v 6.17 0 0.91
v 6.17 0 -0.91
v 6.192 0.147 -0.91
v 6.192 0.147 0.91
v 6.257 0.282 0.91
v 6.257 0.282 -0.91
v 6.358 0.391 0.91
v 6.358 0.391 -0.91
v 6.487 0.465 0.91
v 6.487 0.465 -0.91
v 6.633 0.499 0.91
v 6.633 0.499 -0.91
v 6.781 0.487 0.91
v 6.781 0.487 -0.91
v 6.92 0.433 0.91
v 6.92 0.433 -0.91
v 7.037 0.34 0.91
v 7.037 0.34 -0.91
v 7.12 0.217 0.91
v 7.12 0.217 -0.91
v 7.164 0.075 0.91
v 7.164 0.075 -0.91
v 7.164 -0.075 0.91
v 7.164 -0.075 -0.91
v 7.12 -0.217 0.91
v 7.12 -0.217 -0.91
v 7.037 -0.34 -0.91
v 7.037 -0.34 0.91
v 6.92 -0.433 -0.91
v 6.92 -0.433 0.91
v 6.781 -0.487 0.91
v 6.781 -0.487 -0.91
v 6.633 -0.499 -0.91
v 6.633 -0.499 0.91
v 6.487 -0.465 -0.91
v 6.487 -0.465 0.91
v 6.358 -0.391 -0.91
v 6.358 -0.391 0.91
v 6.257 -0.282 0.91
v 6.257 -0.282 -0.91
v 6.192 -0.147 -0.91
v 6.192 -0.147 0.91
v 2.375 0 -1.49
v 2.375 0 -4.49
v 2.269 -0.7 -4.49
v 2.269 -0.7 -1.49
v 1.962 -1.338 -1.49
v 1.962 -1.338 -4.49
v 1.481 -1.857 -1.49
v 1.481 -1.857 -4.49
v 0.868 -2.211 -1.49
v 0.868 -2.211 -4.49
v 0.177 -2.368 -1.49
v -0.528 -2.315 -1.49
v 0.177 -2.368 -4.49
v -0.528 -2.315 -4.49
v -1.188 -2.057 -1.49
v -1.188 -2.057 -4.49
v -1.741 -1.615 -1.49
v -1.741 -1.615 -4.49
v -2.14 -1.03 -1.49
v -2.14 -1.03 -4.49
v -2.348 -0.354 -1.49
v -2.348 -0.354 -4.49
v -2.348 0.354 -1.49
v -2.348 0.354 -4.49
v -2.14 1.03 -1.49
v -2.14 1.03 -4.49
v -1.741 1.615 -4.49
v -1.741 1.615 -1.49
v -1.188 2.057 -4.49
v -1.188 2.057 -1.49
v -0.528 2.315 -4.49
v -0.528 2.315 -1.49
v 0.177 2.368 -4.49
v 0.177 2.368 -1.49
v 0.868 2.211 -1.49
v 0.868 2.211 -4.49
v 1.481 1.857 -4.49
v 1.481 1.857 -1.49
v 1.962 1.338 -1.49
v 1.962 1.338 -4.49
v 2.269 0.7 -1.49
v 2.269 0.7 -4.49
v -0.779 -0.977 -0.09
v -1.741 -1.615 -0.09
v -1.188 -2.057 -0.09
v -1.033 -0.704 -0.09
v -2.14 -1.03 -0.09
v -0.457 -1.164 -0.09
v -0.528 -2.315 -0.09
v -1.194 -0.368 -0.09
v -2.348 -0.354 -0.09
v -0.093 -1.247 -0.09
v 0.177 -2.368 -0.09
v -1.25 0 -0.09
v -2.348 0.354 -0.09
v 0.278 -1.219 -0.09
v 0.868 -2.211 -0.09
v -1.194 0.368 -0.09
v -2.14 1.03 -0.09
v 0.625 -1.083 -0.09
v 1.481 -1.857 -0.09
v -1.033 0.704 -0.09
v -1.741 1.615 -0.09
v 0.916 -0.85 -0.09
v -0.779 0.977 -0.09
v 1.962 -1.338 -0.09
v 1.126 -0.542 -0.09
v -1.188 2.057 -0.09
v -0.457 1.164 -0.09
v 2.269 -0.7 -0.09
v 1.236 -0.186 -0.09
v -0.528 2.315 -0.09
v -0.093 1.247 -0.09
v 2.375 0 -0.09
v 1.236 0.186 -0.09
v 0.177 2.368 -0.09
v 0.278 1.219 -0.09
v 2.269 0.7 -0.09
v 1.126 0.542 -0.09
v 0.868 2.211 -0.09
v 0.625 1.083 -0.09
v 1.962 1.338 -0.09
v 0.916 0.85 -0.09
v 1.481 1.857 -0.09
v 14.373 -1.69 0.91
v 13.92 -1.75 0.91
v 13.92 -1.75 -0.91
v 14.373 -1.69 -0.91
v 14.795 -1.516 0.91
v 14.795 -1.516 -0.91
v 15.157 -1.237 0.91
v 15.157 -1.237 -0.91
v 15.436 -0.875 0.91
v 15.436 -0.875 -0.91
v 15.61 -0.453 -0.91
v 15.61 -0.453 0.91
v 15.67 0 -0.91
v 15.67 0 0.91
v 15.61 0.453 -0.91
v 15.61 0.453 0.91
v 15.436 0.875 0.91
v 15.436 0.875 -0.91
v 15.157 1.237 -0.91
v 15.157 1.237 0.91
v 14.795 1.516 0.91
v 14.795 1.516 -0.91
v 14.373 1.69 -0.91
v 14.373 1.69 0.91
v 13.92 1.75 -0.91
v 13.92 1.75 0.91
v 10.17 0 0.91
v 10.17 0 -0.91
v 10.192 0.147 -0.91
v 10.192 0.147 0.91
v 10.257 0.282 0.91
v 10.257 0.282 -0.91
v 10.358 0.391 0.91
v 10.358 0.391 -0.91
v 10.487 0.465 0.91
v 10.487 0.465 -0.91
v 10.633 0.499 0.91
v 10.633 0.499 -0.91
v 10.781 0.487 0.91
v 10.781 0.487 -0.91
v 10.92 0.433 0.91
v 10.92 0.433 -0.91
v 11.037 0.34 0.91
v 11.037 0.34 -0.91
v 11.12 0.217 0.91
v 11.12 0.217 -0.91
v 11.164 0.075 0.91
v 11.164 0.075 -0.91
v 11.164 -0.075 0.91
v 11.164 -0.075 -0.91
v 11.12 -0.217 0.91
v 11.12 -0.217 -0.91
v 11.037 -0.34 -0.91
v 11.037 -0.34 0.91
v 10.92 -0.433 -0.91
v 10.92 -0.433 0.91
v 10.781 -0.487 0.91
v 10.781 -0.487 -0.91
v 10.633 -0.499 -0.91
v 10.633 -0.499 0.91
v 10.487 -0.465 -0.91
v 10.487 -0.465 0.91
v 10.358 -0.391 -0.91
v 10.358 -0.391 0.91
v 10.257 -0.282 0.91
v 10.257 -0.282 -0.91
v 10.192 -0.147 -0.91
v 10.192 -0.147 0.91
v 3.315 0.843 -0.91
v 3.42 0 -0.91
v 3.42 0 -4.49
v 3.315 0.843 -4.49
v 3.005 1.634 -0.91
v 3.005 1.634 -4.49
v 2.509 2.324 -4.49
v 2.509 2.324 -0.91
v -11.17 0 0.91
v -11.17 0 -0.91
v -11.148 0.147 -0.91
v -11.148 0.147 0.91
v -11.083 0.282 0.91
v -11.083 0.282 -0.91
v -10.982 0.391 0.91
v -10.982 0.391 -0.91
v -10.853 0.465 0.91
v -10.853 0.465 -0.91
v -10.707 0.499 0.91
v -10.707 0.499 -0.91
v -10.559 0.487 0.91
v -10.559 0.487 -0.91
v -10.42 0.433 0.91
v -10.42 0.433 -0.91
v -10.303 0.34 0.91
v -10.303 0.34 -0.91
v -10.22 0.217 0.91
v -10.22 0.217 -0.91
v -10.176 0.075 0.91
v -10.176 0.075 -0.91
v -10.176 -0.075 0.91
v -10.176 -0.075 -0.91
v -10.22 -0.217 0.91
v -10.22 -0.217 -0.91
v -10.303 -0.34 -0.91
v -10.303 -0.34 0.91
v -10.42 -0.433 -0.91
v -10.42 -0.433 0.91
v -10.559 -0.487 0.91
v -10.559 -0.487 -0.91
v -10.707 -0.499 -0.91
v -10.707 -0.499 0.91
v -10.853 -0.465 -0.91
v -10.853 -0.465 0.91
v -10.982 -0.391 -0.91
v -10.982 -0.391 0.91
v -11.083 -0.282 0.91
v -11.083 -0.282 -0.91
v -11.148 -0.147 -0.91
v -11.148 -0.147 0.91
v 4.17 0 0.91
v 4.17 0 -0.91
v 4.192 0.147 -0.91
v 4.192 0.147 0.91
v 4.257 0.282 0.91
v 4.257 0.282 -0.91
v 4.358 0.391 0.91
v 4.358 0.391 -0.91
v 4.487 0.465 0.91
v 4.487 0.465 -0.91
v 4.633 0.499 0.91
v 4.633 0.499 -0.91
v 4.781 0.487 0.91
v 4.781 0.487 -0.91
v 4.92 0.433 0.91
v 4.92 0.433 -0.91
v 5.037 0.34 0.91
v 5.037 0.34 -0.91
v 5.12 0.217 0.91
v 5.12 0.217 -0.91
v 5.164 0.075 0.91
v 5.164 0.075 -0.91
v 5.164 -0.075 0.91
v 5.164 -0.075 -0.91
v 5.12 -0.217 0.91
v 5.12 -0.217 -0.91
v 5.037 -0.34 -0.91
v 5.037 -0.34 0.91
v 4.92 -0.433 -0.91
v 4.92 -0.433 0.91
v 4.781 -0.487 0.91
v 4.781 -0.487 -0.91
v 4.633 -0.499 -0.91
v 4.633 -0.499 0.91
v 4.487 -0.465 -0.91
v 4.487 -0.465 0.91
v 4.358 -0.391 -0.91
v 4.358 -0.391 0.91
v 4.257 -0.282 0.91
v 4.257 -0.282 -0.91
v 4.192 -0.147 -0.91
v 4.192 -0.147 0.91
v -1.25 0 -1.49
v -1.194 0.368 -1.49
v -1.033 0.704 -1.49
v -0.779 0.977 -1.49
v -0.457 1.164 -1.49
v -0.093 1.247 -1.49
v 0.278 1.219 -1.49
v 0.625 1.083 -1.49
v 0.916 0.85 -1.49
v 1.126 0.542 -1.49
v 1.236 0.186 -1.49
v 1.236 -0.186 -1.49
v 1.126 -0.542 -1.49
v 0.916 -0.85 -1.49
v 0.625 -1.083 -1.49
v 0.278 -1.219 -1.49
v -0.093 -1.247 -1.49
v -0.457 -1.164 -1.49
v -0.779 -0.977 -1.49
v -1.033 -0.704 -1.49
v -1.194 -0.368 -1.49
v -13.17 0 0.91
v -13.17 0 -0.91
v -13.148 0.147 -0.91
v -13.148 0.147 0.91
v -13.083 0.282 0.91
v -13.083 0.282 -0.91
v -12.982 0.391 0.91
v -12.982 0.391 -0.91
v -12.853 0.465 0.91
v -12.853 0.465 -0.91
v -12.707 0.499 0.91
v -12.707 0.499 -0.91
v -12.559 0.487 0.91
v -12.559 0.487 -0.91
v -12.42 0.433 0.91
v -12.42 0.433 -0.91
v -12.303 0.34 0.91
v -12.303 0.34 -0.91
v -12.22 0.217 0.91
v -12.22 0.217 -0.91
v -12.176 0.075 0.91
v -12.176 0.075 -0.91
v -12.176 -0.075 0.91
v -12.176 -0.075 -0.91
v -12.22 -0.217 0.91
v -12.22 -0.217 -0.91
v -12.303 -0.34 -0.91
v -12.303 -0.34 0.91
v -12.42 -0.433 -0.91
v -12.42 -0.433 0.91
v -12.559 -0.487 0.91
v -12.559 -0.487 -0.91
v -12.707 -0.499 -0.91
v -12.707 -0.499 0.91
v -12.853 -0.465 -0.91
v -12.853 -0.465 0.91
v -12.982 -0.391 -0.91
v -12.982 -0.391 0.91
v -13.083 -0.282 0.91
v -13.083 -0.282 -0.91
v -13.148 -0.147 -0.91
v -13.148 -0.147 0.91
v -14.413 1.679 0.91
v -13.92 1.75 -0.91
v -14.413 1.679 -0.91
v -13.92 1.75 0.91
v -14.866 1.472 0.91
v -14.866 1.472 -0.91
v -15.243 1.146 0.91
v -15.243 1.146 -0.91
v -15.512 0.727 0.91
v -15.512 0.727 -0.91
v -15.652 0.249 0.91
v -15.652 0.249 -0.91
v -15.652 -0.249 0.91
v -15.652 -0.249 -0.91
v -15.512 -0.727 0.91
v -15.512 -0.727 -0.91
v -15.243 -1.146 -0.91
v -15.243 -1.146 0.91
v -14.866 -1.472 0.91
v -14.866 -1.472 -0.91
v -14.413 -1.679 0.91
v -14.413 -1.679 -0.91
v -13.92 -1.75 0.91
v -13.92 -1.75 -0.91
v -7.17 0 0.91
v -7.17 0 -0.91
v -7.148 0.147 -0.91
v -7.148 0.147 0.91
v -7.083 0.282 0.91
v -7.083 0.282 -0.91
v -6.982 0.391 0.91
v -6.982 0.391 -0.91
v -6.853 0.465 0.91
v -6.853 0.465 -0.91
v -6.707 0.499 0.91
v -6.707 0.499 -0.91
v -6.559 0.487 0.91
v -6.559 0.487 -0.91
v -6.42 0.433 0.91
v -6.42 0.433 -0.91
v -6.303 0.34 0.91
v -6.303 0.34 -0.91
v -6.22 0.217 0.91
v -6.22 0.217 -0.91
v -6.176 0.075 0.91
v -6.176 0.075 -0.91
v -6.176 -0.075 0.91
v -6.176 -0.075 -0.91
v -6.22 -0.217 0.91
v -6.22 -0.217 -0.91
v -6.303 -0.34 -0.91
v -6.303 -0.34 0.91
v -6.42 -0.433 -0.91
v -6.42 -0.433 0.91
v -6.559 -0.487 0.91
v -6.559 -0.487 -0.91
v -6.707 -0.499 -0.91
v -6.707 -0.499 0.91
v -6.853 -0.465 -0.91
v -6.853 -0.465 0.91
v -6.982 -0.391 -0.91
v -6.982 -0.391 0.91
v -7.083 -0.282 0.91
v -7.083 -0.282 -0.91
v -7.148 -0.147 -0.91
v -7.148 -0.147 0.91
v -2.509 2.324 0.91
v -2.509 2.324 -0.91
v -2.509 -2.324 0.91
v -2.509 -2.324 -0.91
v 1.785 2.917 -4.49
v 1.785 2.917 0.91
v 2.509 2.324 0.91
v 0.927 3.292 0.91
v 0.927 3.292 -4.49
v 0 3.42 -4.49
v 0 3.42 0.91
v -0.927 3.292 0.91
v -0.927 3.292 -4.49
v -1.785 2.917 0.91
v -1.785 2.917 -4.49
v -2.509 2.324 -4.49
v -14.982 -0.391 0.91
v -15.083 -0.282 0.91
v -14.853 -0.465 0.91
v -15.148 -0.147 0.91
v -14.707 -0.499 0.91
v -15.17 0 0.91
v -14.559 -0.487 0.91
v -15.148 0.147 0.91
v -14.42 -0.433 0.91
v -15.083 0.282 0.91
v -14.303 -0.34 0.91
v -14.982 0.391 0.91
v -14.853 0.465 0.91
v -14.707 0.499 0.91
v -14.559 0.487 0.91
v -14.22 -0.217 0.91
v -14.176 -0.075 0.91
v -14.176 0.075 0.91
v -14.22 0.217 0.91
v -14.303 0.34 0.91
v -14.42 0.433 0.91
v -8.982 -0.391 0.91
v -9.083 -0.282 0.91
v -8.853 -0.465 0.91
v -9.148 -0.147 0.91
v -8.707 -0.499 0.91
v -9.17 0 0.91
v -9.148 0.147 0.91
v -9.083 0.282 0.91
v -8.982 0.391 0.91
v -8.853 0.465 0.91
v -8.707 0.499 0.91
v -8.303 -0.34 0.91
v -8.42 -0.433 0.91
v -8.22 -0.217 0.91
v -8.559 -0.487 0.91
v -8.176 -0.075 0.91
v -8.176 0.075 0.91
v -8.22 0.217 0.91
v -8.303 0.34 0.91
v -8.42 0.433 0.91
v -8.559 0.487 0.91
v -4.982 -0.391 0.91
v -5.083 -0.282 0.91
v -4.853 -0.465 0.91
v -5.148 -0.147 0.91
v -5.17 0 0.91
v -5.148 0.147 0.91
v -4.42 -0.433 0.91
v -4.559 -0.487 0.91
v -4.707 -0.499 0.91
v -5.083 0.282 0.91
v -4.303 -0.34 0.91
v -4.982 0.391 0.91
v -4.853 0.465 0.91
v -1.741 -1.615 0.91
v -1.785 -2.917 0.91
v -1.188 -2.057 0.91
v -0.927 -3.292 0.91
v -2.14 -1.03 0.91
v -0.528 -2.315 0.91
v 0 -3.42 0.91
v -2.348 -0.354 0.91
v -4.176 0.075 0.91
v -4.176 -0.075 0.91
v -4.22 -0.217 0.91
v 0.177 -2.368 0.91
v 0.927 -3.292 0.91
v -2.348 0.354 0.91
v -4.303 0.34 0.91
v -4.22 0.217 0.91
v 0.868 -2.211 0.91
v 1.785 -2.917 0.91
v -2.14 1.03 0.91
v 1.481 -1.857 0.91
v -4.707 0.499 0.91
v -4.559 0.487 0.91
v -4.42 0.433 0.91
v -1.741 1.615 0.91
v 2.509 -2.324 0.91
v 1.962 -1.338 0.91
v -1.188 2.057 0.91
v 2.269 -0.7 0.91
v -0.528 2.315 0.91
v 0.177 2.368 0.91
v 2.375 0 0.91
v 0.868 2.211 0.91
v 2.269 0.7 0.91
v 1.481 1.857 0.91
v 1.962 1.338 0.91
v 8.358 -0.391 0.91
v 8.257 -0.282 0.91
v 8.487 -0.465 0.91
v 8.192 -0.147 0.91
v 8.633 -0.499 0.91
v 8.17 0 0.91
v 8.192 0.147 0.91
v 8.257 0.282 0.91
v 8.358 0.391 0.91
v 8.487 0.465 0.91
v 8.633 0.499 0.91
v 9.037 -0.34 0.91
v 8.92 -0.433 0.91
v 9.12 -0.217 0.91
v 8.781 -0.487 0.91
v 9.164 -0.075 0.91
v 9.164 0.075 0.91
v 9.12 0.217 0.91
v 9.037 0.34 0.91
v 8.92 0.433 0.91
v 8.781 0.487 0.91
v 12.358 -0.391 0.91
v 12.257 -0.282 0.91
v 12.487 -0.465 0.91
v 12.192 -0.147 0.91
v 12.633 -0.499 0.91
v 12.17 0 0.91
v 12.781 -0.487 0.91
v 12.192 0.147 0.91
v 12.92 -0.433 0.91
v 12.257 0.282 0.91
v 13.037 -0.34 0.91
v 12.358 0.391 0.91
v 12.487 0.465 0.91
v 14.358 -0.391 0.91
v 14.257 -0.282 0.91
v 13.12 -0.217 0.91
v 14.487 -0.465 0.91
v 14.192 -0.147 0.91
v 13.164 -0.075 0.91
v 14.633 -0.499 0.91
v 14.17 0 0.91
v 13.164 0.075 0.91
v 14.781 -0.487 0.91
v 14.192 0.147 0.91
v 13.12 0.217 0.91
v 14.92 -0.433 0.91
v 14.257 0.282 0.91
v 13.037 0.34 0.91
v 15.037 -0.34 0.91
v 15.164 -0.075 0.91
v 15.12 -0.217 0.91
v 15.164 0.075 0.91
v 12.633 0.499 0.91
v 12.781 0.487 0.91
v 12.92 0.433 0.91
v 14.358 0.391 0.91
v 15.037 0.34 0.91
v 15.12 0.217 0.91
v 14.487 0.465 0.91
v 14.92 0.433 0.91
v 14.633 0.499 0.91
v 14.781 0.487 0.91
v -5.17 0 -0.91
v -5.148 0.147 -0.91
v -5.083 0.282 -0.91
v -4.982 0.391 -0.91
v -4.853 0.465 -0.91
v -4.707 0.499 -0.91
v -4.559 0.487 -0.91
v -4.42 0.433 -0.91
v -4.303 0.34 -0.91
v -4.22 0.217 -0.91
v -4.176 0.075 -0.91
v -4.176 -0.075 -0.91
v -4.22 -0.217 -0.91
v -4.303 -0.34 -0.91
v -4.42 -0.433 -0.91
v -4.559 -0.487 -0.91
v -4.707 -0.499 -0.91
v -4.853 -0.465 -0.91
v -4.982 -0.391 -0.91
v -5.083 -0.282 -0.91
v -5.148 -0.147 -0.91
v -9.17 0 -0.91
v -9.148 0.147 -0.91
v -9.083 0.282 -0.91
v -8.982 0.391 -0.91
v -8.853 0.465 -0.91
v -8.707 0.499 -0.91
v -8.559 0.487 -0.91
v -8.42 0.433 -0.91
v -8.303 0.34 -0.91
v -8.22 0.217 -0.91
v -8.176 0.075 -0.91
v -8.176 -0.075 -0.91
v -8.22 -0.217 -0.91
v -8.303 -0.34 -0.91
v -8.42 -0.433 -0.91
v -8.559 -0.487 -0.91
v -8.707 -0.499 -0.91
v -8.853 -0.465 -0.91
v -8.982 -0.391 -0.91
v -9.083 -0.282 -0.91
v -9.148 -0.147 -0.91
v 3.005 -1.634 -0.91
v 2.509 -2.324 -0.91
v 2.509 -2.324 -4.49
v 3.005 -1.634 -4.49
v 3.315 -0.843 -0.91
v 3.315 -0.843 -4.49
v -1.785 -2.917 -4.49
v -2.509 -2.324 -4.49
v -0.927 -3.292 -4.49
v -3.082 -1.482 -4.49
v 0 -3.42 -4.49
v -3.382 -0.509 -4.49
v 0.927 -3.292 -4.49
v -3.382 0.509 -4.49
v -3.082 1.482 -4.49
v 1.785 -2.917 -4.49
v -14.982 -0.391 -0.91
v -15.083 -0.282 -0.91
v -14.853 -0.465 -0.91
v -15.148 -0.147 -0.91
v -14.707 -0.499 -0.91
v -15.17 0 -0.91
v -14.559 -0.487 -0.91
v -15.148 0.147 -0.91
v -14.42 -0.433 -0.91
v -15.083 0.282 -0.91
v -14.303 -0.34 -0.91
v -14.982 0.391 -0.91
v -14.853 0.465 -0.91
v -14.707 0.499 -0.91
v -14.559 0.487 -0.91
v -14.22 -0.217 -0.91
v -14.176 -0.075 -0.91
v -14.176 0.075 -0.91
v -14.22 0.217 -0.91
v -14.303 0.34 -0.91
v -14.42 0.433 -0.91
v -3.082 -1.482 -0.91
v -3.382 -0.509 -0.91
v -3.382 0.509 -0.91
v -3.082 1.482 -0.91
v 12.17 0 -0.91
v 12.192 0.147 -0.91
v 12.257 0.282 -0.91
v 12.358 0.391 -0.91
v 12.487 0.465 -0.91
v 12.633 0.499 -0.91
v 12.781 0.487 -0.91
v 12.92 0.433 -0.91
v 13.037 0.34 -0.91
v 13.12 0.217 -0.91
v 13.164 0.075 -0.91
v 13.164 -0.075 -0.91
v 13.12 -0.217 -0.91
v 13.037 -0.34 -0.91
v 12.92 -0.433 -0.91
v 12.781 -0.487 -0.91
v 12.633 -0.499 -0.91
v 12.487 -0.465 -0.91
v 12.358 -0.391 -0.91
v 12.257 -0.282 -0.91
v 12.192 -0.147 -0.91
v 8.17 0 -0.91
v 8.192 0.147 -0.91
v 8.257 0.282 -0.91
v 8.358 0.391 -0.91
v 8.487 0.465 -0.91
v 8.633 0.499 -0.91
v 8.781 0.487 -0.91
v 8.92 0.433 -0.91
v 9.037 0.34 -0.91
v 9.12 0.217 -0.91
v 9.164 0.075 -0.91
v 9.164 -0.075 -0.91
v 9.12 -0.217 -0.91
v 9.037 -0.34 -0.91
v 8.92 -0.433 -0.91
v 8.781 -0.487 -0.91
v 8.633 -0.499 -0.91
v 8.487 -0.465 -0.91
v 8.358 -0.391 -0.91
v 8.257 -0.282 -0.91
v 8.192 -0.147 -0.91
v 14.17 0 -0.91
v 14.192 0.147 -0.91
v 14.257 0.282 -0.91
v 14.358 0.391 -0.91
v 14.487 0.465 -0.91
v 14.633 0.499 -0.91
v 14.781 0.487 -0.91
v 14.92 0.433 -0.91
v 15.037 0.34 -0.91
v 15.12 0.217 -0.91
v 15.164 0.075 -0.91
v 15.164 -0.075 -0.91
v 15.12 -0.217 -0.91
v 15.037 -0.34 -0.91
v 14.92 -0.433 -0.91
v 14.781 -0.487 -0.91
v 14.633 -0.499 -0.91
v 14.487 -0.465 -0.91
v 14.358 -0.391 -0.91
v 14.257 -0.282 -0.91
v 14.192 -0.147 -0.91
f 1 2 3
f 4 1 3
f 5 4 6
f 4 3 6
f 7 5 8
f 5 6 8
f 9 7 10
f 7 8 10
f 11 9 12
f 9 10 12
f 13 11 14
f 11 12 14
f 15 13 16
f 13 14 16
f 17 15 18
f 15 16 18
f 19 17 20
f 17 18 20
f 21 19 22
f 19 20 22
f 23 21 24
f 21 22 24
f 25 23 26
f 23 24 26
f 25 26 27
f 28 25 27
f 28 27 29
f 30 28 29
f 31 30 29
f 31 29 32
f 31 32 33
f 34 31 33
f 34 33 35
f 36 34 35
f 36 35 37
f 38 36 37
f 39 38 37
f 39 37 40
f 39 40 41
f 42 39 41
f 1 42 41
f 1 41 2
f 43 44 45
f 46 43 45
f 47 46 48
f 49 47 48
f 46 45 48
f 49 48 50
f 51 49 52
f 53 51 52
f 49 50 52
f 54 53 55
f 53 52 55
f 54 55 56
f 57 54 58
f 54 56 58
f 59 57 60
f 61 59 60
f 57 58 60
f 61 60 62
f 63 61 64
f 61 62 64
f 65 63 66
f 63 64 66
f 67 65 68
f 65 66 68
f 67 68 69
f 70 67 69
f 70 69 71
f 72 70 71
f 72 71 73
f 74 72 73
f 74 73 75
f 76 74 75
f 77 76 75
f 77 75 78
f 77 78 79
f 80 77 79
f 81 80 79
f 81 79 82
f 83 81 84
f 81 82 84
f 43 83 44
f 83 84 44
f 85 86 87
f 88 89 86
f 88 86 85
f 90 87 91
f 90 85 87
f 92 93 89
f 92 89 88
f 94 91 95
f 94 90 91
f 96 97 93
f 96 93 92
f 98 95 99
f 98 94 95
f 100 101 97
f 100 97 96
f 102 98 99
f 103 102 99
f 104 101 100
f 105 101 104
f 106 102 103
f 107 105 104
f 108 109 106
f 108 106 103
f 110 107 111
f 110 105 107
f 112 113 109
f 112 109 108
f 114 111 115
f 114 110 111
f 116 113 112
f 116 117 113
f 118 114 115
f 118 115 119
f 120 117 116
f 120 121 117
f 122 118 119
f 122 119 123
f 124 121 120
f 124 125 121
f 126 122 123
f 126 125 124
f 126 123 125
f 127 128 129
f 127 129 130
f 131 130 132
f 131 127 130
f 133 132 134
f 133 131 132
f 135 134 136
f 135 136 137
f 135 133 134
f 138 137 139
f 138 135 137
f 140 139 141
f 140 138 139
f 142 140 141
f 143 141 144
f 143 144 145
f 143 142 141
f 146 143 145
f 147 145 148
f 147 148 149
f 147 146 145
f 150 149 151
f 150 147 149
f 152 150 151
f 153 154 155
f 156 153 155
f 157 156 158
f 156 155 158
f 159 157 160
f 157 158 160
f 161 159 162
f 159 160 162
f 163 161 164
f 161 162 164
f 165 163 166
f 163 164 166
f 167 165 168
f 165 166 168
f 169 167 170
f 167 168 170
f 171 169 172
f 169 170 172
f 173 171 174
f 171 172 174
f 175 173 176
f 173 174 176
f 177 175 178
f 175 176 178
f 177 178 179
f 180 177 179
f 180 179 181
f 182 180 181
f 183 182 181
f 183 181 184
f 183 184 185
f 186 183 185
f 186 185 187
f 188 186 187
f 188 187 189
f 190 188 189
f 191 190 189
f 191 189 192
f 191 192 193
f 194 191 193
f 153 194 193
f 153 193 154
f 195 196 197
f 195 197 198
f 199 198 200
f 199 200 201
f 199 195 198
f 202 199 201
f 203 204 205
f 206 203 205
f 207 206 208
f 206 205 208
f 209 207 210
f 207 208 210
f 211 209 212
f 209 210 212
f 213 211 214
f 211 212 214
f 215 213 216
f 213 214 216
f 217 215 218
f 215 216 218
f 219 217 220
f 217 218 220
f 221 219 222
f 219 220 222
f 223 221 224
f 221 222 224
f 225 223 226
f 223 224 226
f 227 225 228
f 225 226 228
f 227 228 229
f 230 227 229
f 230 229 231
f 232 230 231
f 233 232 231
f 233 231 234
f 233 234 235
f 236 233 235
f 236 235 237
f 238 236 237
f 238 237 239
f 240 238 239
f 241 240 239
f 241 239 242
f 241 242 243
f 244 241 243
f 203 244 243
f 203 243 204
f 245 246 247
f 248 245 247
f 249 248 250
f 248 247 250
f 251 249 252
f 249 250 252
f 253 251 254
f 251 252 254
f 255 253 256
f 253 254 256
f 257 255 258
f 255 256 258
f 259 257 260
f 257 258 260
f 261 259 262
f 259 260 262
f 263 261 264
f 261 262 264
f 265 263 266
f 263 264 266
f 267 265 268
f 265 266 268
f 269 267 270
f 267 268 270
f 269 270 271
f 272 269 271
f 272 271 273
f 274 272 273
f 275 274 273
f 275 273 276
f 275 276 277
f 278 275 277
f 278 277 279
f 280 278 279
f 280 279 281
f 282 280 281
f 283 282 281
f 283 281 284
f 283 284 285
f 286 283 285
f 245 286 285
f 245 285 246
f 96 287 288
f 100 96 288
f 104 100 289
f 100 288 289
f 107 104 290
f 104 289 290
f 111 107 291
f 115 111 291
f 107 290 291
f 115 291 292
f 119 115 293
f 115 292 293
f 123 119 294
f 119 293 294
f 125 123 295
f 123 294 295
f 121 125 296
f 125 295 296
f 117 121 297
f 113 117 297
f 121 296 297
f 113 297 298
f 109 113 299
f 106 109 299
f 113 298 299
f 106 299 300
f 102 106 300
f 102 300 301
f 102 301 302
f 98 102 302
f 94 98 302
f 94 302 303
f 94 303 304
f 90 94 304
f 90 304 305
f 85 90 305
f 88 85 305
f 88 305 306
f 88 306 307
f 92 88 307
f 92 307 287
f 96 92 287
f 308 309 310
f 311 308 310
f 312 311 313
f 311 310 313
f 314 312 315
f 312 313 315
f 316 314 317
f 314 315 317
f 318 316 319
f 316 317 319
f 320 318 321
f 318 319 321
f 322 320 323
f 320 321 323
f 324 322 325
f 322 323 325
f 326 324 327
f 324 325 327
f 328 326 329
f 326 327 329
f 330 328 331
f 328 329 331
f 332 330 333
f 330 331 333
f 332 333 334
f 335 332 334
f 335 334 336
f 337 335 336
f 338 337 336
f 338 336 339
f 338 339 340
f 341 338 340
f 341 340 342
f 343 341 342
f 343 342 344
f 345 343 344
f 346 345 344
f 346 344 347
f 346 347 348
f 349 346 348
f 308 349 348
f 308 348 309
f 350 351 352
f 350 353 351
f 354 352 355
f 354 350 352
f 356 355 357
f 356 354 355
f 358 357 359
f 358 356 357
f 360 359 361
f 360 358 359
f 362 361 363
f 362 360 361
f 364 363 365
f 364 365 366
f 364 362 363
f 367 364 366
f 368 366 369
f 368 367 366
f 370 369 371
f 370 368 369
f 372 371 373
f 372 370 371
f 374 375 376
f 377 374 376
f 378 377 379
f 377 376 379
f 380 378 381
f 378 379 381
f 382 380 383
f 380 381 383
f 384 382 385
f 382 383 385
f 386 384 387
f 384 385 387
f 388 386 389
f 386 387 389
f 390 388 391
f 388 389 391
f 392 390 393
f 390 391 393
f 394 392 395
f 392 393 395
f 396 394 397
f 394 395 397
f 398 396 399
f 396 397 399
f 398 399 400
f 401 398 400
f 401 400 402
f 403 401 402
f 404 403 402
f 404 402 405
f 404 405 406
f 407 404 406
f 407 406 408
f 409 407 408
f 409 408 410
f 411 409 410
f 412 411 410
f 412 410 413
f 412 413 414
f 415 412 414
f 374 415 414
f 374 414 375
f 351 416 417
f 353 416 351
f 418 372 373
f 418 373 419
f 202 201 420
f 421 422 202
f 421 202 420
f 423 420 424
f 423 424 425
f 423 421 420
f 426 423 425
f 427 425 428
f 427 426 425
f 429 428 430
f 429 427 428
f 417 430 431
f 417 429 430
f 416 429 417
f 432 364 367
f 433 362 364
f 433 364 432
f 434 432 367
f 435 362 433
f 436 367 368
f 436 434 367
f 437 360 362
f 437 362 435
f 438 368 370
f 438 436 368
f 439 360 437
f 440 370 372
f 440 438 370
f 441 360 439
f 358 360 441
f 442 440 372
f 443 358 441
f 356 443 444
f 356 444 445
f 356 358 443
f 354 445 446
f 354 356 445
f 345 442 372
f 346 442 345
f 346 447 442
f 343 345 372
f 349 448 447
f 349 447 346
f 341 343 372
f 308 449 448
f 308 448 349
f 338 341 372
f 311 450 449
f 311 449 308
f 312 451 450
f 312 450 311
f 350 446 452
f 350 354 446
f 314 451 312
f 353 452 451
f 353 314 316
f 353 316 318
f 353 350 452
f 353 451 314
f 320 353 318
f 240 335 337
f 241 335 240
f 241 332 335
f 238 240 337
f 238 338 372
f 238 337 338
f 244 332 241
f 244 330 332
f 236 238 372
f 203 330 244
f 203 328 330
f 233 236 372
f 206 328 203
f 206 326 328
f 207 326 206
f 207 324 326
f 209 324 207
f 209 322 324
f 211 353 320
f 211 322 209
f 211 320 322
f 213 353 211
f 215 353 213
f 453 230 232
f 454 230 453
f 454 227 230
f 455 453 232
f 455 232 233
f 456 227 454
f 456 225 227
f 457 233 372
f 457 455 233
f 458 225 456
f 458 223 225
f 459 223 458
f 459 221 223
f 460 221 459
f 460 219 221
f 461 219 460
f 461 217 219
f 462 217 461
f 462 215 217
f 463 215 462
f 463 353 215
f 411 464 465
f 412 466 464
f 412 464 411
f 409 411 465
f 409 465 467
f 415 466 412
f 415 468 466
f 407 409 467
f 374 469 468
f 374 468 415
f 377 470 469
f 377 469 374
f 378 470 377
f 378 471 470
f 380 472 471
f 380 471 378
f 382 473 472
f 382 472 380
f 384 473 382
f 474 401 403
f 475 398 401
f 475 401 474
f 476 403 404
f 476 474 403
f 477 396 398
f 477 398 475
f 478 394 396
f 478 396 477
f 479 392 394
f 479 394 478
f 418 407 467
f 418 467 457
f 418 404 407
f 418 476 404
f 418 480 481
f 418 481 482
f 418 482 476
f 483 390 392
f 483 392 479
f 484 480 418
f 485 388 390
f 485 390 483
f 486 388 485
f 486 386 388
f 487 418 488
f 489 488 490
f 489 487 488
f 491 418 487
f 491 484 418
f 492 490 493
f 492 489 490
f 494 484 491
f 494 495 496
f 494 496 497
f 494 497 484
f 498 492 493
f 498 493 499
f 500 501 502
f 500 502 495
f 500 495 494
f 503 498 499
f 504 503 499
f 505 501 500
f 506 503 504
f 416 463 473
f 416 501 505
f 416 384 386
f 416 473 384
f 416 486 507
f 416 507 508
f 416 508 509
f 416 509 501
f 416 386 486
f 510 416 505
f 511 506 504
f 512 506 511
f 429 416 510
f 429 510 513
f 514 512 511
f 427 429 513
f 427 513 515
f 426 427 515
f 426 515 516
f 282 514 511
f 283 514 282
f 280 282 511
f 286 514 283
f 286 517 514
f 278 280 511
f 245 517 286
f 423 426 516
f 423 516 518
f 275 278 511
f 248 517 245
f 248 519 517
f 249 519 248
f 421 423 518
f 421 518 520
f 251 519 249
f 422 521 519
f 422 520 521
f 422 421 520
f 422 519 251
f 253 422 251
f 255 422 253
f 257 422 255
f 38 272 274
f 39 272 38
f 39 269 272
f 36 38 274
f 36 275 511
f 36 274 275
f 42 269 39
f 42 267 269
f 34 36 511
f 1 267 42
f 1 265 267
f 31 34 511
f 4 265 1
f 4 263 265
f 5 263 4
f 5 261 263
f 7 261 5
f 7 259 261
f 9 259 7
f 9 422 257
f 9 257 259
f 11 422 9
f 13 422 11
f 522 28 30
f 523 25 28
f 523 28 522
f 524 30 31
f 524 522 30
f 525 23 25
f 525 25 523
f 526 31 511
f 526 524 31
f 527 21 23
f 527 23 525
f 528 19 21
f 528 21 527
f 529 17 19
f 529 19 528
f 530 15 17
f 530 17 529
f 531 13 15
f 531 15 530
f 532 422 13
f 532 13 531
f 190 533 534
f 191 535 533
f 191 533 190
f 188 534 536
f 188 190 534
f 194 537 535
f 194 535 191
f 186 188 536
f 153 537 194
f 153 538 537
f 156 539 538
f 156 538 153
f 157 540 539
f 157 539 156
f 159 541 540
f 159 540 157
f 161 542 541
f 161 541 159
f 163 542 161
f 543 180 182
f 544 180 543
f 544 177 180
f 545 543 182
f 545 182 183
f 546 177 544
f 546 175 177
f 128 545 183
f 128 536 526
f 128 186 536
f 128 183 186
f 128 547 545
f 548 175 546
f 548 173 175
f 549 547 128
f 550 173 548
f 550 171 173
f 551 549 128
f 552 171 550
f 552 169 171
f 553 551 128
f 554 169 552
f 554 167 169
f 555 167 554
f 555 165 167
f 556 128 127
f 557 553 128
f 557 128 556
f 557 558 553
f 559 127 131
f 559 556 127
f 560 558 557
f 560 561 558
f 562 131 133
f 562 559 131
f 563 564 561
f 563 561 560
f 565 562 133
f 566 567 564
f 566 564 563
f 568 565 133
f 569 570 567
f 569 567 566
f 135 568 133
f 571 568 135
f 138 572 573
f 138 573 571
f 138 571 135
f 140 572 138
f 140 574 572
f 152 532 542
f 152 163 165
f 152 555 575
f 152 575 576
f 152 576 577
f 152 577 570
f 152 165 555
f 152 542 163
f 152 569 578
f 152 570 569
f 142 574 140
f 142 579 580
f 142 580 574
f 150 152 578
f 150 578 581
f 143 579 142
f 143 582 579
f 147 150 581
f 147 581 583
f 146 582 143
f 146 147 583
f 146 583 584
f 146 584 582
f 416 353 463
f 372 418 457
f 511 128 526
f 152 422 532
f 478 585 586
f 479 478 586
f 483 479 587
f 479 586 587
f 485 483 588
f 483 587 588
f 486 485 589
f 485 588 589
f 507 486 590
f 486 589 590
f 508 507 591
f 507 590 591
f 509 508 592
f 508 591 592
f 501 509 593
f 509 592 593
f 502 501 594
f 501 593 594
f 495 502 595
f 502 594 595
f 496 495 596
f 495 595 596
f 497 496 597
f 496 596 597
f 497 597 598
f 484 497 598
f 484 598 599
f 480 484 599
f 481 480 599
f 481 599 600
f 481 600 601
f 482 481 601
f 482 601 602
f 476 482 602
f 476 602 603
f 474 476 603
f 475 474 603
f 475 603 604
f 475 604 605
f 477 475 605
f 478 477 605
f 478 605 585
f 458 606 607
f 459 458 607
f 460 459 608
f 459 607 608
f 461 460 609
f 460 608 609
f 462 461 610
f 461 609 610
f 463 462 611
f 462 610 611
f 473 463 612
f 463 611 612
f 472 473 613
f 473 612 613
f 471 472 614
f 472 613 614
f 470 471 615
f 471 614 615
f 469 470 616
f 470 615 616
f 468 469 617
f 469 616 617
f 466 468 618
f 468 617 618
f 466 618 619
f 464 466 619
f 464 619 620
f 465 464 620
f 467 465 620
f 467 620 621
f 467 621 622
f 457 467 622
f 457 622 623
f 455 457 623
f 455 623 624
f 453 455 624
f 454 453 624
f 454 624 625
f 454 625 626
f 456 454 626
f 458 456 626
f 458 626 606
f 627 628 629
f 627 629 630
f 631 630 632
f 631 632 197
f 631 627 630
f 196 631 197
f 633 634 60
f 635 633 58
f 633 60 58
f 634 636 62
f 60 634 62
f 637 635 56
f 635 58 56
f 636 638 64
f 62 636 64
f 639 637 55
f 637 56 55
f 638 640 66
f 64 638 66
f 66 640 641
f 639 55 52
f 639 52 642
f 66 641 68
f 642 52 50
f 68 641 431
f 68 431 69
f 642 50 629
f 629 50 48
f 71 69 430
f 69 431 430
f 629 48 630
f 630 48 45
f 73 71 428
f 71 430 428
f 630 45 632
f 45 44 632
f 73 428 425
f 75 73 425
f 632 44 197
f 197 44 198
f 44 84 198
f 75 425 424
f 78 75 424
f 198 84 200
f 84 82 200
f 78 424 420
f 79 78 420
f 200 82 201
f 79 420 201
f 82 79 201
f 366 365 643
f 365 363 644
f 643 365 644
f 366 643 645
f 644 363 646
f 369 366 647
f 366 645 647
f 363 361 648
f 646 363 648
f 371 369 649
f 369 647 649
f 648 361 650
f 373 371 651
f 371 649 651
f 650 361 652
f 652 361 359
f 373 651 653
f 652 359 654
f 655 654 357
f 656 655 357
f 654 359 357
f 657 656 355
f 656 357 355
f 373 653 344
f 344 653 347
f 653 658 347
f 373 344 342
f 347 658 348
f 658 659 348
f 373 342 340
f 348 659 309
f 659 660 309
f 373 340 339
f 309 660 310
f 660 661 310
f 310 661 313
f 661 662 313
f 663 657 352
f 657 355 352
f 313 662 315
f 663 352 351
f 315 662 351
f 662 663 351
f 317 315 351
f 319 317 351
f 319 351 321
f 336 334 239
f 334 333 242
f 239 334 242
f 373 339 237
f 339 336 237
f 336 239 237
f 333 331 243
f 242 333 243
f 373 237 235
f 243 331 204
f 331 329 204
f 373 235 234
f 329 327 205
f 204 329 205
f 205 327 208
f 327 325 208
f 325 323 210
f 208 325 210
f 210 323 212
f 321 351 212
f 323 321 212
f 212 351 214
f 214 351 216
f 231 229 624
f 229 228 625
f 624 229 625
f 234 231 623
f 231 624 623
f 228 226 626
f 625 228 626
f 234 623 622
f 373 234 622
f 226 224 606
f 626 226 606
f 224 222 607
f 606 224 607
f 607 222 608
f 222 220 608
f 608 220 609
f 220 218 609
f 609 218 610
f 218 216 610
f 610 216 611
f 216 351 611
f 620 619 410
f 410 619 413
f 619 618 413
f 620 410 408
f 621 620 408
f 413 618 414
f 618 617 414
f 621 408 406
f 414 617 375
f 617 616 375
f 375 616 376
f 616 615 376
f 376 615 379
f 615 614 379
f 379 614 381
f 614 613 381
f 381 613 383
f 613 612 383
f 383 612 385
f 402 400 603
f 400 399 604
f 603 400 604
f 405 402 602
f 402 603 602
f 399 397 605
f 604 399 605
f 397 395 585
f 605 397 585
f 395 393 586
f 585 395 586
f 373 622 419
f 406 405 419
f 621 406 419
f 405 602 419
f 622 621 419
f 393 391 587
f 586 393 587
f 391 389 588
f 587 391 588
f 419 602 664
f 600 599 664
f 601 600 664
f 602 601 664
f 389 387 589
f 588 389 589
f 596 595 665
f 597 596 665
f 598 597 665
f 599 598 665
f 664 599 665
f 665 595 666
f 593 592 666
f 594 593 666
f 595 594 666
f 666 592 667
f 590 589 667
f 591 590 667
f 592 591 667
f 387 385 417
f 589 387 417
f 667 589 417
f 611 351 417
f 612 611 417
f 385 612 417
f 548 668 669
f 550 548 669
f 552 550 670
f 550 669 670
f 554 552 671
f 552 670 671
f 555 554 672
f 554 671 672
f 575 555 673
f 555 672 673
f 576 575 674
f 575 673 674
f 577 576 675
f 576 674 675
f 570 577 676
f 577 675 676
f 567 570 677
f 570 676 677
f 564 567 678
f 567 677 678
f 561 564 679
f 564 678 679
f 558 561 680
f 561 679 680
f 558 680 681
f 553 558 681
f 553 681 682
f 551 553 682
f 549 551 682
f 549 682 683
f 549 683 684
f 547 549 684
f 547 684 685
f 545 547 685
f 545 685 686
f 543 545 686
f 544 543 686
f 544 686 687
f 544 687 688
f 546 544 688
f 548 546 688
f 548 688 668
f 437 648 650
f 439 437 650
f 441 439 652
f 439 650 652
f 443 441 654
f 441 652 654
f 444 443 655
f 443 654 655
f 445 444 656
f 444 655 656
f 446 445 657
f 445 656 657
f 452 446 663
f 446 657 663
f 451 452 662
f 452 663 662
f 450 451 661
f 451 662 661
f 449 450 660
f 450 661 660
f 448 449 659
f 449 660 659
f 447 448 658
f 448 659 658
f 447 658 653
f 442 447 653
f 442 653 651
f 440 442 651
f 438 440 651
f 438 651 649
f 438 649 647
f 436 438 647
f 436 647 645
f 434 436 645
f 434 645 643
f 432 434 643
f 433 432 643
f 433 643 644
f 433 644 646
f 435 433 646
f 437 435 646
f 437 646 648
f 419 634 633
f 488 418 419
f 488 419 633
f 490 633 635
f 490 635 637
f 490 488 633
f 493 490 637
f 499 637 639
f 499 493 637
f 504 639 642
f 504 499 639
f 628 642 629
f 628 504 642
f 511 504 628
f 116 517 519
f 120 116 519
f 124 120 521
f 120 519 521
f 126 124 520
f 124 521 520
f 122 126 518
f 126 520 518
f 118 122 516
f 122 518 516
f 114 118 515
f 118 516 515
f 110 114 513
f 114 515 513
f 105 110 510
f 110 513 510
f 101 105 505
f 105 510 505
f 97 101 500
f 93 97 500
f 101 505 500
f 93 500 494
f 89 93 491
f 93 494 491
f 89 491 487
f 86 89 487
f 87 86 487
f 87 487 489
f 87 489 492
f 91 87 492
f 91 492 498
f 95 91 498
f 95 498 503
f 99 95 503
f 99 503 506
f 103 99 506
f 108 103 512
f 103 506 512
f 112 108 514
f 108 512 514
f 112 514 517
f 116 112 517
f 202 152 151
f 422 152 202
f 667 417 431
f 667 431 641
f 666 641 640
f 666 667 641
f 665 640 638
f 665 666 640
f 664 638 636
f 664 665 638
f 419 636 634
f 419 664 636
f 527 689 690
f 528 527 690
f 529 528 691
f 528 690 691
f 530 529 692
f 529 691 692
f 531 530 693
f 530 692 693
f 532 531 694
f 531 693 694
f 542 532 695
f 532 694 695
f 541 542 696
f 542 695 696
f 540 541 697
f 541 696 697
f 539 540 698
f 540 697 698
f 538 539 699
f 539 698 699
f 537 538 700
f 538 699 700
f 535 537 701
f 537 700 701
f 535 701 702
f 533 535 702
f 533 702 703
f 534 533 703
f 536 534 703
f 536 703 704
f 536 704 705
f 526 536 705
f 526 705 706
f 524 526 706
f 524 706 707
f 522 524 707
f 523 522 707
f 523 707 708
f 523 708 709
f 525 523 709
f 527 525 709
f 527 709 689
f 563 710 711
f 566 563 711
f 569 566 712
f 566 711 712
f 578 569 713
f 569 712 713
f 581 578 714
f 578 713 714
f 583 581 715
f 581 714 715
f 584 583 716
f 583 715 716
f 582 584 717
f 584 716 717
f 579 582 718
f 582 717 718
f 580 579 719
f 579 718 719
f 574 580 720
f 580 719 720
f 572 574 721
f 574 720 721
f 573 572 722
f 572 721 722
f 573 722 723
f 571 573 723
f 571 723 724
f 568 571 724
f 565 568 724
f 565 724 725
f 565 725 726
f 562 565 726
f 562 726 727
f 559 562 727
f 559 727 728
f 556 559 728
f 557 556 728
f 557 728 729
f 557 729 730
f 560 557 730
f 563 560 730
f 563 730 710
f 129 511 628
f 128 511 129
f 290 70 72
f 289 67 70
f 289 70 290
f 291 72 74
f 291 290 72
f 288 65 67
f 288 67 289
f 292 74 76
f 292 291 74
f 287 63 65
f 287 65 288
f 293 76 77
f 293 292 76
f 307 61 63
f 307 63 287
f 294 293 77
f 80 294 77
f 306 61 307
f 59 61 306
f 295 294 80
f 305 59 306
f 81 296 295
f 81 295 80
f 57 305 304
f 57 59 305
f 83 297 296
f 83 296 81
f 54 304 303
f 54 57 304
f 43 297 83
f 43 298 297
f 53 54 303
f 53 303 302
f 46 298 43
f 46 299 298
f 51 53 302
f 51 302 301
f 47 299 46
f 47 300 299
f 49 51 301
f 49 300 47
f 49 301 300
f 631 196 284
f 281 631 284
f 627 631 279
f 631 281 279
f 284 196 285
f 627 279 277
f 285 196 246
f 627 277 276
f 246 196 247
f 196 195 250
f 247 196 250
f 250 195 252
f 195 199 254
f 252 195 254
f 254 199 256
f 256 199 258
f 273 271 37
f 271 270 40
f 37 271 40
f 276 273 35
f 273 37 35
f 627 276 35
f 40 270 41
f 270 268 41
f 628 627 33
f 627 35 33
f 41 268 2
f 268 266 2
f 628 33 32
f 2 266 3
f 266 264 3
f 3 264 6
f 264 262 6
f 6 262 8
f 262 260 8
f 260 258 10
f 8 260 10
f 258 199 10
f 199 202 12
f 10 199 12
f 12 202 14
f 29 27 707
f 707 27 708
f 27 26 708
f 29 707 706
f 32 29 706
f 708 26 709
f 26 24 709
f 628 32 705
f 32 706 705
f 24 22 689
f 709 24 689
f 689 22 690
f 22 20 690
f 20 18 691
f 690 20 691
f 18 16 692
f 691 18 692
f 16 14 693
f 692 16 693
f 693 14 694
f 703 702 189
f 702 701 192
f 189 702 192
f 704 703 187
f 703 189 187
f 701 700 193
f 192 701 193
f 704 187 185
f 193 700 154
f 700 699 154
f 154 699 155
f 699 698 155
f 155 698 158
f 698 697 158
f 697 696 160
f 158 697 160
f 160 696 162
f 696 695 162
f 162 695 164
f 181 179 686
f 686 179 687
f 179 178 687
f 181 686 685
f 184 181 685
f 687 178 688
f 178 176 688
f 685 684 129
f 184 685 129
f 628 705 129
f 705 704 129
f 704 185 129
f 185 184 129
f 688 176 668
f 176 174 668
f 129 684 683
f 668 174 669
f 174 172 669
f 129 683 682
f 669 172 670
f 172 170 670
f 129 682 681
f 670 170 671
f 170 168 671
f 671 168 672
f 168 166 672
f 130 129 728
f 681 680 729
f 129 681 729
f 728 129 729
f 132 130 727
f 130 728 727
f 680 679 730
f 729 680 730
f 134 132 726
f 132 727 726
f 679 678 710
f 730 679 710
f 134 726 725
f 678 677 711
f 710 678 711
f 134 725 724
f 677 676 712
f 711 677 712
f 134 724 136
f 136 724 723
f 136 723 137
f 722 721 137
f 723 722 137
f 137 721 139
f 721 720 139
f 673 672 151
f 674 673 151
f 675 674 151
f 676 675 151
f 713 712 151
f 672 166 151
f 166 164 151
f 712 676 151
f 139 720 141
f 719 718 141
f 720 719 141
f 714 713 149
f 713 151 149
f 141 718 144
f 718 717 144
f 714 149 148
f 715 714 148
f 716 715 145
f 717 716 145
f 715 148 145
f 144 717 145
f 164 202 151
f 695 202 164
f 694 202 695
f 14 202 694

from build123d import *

# Parameters (mm, degrees)
F1_DEPTH = 0.91
F3_DEPTH = 5.4
F4_R     = 2.375
F5_DEPTH = 1
F6_R     = 2.375
F7_DEPTH = 3
F9_D     = 2.5
F11_D    = 1


with BuildPart() as f1:
    # F0 (on Top) → F1 (new body, symmetric)
    with BuildSketch(Plane.XY):
        with BuildLine():
            Line((-13.92, -1.75), (-13.92, 1.75))
            ThreePointArc((-13.92, 1.75), (-15.67, 0), (-13.92, -1.75))
        make_face()
        with BuildLine():
            ThreePointArc((-13.92, -1.75), (-12.6825631329, -1.2374368671), (-12.17, 0))
            ThreePointArc((-12.17, 0), (-12.6825631329, 1.2374368671), (-13.92, 1.75))
            Line((-13.92, 1.75), (-13.92, -1.75))
        make_face()
        with BuildLine():
            ThreePointArc((-13.92, 1.75), (-12.6825631329, 1.2374368671), (-12.17, 0))
            ThreePointArc((-12.17, 0), (-12.6825631329, -1.2374368671), (-13.92, -1.75))
            Line((-13.92, -1.75), (0, -2.45))
            Line((0, -2.45), (0, 2.45))
            Line((0, 2.45), (-13.92, 1.75))
        make_face()
        with BuildLine():
            Line((13.92, 1.75), (0, 2.45))
            Line((0, 2.45), (0, -2.45))
            Line((0, -2.45), (13.92, -1.75))
            ThreePointArc((13.92, -1.75), (12.17, 0), (13.92, 1.75))
        make_face()
        with BuildLine():
            Line((13.92, -1.75), (13.92, 1.75))
            ThreePointArc((13.92, 1.75), (12.17, 0), (13.92, -1.75))
        make_face()
        with BuildLine():
            ThreePointArc((15.67, 0), (15.1574368671, 1.2374368671), (13.92, 1.75))
            Line((13.92, 1.75), (13.92, -1.75))
            ThreePointArc((13.92, -1.75), (15.1574368671, -1.2374368671), (15.67, 0))
        make_face()
    extrude(amount=F1_DEPTH, both=True)

    # F2 (on face) → F3 (join)
    with BuildSketch(Plane.XY.offset(0.91)):
        with BuildLine():
            Line((0, 2.45), (2.5092377818, 2.3238170656))
            ThreePointArc((2.5092377818, 2.3238170656), (0, 3.42), (-2.5092377818, 2.3238170656))
            Line((-2.5092377818, 2.3238170656), (0, 2.45))
        make_face()
        with BuildLine():
            ThreePointArc((2.5092377818, -2.3238170656), (3.1841791104, -1.2479596921), (3.42, 0))
            ThreePointArc((3.42, 0), (3.1841791104, 1.2479596921), (2.5092377818, 2.3238170656))
            Line((2.5092377818, 2.3238170656), (0, 2.45))
            Line((0, 2.45), (-2.5092377818, 2.3238170656))
            ThreePointArc((-2.5092377818, 2.3238170656), (-3.42, 0), (-2.5092377818, -2.3238170656))
            Line((-2.5092377818, -2.3238170656), (0, -2.45))
            Line((0, -2.45), (2.5092377818, -2.3238170656))
        make_face()
        with BuildLine():
            ThreePointArc((-2.5092377818, -2.3238170656), (0, -3.42), (2.5092377818, -2.3238170656))
            Line((2.5092377818, -2.3238170656), (0, -2.45))
            Line((0, -2.45), (-2.5092377818, -2.3238170656))
        make_face()
    extrude(amount=-F3_DEPTH)

    # F4 (on face) → F5 (cut)
    with BuildSketch(Plane.XY.offset(0.91)):
        Circle(F4_R)
    extrude(amount=-F5_DEPTH, mode=Mode.SUBTRACT)

    # F6 (on face) → F7 (cut)
    with BuildSketch(Plane(origin=(0, 0, -4.49), x_dir=(1, 0, 0), z_dir=(0, 0, -1))):
        Circle(F6_R)
    extrude(amount=-F7_DEPTH, mode=Mode.SUBTRACT)

    # F9 (through all)
    with Locations(Plane.XY.offset(-0.09)):
        with Locations((0, 0)):
            Hole(F9_D / 2)

    # F11 (through all)
    with Locations(Plane.XY.offset(0.91)):
        with Locations((-14.67, 0), (-12.67, 0), (-10.67, 0), (-8.67, 0), (-6.67, 0), (-4.67, 0), (4.67, 0), (6.67, 0), (8.67, 0), (10.67, 0), (12.67, 0), (14.67, 0)):
            Hole(F11_D / 2)


solid = f1.part
